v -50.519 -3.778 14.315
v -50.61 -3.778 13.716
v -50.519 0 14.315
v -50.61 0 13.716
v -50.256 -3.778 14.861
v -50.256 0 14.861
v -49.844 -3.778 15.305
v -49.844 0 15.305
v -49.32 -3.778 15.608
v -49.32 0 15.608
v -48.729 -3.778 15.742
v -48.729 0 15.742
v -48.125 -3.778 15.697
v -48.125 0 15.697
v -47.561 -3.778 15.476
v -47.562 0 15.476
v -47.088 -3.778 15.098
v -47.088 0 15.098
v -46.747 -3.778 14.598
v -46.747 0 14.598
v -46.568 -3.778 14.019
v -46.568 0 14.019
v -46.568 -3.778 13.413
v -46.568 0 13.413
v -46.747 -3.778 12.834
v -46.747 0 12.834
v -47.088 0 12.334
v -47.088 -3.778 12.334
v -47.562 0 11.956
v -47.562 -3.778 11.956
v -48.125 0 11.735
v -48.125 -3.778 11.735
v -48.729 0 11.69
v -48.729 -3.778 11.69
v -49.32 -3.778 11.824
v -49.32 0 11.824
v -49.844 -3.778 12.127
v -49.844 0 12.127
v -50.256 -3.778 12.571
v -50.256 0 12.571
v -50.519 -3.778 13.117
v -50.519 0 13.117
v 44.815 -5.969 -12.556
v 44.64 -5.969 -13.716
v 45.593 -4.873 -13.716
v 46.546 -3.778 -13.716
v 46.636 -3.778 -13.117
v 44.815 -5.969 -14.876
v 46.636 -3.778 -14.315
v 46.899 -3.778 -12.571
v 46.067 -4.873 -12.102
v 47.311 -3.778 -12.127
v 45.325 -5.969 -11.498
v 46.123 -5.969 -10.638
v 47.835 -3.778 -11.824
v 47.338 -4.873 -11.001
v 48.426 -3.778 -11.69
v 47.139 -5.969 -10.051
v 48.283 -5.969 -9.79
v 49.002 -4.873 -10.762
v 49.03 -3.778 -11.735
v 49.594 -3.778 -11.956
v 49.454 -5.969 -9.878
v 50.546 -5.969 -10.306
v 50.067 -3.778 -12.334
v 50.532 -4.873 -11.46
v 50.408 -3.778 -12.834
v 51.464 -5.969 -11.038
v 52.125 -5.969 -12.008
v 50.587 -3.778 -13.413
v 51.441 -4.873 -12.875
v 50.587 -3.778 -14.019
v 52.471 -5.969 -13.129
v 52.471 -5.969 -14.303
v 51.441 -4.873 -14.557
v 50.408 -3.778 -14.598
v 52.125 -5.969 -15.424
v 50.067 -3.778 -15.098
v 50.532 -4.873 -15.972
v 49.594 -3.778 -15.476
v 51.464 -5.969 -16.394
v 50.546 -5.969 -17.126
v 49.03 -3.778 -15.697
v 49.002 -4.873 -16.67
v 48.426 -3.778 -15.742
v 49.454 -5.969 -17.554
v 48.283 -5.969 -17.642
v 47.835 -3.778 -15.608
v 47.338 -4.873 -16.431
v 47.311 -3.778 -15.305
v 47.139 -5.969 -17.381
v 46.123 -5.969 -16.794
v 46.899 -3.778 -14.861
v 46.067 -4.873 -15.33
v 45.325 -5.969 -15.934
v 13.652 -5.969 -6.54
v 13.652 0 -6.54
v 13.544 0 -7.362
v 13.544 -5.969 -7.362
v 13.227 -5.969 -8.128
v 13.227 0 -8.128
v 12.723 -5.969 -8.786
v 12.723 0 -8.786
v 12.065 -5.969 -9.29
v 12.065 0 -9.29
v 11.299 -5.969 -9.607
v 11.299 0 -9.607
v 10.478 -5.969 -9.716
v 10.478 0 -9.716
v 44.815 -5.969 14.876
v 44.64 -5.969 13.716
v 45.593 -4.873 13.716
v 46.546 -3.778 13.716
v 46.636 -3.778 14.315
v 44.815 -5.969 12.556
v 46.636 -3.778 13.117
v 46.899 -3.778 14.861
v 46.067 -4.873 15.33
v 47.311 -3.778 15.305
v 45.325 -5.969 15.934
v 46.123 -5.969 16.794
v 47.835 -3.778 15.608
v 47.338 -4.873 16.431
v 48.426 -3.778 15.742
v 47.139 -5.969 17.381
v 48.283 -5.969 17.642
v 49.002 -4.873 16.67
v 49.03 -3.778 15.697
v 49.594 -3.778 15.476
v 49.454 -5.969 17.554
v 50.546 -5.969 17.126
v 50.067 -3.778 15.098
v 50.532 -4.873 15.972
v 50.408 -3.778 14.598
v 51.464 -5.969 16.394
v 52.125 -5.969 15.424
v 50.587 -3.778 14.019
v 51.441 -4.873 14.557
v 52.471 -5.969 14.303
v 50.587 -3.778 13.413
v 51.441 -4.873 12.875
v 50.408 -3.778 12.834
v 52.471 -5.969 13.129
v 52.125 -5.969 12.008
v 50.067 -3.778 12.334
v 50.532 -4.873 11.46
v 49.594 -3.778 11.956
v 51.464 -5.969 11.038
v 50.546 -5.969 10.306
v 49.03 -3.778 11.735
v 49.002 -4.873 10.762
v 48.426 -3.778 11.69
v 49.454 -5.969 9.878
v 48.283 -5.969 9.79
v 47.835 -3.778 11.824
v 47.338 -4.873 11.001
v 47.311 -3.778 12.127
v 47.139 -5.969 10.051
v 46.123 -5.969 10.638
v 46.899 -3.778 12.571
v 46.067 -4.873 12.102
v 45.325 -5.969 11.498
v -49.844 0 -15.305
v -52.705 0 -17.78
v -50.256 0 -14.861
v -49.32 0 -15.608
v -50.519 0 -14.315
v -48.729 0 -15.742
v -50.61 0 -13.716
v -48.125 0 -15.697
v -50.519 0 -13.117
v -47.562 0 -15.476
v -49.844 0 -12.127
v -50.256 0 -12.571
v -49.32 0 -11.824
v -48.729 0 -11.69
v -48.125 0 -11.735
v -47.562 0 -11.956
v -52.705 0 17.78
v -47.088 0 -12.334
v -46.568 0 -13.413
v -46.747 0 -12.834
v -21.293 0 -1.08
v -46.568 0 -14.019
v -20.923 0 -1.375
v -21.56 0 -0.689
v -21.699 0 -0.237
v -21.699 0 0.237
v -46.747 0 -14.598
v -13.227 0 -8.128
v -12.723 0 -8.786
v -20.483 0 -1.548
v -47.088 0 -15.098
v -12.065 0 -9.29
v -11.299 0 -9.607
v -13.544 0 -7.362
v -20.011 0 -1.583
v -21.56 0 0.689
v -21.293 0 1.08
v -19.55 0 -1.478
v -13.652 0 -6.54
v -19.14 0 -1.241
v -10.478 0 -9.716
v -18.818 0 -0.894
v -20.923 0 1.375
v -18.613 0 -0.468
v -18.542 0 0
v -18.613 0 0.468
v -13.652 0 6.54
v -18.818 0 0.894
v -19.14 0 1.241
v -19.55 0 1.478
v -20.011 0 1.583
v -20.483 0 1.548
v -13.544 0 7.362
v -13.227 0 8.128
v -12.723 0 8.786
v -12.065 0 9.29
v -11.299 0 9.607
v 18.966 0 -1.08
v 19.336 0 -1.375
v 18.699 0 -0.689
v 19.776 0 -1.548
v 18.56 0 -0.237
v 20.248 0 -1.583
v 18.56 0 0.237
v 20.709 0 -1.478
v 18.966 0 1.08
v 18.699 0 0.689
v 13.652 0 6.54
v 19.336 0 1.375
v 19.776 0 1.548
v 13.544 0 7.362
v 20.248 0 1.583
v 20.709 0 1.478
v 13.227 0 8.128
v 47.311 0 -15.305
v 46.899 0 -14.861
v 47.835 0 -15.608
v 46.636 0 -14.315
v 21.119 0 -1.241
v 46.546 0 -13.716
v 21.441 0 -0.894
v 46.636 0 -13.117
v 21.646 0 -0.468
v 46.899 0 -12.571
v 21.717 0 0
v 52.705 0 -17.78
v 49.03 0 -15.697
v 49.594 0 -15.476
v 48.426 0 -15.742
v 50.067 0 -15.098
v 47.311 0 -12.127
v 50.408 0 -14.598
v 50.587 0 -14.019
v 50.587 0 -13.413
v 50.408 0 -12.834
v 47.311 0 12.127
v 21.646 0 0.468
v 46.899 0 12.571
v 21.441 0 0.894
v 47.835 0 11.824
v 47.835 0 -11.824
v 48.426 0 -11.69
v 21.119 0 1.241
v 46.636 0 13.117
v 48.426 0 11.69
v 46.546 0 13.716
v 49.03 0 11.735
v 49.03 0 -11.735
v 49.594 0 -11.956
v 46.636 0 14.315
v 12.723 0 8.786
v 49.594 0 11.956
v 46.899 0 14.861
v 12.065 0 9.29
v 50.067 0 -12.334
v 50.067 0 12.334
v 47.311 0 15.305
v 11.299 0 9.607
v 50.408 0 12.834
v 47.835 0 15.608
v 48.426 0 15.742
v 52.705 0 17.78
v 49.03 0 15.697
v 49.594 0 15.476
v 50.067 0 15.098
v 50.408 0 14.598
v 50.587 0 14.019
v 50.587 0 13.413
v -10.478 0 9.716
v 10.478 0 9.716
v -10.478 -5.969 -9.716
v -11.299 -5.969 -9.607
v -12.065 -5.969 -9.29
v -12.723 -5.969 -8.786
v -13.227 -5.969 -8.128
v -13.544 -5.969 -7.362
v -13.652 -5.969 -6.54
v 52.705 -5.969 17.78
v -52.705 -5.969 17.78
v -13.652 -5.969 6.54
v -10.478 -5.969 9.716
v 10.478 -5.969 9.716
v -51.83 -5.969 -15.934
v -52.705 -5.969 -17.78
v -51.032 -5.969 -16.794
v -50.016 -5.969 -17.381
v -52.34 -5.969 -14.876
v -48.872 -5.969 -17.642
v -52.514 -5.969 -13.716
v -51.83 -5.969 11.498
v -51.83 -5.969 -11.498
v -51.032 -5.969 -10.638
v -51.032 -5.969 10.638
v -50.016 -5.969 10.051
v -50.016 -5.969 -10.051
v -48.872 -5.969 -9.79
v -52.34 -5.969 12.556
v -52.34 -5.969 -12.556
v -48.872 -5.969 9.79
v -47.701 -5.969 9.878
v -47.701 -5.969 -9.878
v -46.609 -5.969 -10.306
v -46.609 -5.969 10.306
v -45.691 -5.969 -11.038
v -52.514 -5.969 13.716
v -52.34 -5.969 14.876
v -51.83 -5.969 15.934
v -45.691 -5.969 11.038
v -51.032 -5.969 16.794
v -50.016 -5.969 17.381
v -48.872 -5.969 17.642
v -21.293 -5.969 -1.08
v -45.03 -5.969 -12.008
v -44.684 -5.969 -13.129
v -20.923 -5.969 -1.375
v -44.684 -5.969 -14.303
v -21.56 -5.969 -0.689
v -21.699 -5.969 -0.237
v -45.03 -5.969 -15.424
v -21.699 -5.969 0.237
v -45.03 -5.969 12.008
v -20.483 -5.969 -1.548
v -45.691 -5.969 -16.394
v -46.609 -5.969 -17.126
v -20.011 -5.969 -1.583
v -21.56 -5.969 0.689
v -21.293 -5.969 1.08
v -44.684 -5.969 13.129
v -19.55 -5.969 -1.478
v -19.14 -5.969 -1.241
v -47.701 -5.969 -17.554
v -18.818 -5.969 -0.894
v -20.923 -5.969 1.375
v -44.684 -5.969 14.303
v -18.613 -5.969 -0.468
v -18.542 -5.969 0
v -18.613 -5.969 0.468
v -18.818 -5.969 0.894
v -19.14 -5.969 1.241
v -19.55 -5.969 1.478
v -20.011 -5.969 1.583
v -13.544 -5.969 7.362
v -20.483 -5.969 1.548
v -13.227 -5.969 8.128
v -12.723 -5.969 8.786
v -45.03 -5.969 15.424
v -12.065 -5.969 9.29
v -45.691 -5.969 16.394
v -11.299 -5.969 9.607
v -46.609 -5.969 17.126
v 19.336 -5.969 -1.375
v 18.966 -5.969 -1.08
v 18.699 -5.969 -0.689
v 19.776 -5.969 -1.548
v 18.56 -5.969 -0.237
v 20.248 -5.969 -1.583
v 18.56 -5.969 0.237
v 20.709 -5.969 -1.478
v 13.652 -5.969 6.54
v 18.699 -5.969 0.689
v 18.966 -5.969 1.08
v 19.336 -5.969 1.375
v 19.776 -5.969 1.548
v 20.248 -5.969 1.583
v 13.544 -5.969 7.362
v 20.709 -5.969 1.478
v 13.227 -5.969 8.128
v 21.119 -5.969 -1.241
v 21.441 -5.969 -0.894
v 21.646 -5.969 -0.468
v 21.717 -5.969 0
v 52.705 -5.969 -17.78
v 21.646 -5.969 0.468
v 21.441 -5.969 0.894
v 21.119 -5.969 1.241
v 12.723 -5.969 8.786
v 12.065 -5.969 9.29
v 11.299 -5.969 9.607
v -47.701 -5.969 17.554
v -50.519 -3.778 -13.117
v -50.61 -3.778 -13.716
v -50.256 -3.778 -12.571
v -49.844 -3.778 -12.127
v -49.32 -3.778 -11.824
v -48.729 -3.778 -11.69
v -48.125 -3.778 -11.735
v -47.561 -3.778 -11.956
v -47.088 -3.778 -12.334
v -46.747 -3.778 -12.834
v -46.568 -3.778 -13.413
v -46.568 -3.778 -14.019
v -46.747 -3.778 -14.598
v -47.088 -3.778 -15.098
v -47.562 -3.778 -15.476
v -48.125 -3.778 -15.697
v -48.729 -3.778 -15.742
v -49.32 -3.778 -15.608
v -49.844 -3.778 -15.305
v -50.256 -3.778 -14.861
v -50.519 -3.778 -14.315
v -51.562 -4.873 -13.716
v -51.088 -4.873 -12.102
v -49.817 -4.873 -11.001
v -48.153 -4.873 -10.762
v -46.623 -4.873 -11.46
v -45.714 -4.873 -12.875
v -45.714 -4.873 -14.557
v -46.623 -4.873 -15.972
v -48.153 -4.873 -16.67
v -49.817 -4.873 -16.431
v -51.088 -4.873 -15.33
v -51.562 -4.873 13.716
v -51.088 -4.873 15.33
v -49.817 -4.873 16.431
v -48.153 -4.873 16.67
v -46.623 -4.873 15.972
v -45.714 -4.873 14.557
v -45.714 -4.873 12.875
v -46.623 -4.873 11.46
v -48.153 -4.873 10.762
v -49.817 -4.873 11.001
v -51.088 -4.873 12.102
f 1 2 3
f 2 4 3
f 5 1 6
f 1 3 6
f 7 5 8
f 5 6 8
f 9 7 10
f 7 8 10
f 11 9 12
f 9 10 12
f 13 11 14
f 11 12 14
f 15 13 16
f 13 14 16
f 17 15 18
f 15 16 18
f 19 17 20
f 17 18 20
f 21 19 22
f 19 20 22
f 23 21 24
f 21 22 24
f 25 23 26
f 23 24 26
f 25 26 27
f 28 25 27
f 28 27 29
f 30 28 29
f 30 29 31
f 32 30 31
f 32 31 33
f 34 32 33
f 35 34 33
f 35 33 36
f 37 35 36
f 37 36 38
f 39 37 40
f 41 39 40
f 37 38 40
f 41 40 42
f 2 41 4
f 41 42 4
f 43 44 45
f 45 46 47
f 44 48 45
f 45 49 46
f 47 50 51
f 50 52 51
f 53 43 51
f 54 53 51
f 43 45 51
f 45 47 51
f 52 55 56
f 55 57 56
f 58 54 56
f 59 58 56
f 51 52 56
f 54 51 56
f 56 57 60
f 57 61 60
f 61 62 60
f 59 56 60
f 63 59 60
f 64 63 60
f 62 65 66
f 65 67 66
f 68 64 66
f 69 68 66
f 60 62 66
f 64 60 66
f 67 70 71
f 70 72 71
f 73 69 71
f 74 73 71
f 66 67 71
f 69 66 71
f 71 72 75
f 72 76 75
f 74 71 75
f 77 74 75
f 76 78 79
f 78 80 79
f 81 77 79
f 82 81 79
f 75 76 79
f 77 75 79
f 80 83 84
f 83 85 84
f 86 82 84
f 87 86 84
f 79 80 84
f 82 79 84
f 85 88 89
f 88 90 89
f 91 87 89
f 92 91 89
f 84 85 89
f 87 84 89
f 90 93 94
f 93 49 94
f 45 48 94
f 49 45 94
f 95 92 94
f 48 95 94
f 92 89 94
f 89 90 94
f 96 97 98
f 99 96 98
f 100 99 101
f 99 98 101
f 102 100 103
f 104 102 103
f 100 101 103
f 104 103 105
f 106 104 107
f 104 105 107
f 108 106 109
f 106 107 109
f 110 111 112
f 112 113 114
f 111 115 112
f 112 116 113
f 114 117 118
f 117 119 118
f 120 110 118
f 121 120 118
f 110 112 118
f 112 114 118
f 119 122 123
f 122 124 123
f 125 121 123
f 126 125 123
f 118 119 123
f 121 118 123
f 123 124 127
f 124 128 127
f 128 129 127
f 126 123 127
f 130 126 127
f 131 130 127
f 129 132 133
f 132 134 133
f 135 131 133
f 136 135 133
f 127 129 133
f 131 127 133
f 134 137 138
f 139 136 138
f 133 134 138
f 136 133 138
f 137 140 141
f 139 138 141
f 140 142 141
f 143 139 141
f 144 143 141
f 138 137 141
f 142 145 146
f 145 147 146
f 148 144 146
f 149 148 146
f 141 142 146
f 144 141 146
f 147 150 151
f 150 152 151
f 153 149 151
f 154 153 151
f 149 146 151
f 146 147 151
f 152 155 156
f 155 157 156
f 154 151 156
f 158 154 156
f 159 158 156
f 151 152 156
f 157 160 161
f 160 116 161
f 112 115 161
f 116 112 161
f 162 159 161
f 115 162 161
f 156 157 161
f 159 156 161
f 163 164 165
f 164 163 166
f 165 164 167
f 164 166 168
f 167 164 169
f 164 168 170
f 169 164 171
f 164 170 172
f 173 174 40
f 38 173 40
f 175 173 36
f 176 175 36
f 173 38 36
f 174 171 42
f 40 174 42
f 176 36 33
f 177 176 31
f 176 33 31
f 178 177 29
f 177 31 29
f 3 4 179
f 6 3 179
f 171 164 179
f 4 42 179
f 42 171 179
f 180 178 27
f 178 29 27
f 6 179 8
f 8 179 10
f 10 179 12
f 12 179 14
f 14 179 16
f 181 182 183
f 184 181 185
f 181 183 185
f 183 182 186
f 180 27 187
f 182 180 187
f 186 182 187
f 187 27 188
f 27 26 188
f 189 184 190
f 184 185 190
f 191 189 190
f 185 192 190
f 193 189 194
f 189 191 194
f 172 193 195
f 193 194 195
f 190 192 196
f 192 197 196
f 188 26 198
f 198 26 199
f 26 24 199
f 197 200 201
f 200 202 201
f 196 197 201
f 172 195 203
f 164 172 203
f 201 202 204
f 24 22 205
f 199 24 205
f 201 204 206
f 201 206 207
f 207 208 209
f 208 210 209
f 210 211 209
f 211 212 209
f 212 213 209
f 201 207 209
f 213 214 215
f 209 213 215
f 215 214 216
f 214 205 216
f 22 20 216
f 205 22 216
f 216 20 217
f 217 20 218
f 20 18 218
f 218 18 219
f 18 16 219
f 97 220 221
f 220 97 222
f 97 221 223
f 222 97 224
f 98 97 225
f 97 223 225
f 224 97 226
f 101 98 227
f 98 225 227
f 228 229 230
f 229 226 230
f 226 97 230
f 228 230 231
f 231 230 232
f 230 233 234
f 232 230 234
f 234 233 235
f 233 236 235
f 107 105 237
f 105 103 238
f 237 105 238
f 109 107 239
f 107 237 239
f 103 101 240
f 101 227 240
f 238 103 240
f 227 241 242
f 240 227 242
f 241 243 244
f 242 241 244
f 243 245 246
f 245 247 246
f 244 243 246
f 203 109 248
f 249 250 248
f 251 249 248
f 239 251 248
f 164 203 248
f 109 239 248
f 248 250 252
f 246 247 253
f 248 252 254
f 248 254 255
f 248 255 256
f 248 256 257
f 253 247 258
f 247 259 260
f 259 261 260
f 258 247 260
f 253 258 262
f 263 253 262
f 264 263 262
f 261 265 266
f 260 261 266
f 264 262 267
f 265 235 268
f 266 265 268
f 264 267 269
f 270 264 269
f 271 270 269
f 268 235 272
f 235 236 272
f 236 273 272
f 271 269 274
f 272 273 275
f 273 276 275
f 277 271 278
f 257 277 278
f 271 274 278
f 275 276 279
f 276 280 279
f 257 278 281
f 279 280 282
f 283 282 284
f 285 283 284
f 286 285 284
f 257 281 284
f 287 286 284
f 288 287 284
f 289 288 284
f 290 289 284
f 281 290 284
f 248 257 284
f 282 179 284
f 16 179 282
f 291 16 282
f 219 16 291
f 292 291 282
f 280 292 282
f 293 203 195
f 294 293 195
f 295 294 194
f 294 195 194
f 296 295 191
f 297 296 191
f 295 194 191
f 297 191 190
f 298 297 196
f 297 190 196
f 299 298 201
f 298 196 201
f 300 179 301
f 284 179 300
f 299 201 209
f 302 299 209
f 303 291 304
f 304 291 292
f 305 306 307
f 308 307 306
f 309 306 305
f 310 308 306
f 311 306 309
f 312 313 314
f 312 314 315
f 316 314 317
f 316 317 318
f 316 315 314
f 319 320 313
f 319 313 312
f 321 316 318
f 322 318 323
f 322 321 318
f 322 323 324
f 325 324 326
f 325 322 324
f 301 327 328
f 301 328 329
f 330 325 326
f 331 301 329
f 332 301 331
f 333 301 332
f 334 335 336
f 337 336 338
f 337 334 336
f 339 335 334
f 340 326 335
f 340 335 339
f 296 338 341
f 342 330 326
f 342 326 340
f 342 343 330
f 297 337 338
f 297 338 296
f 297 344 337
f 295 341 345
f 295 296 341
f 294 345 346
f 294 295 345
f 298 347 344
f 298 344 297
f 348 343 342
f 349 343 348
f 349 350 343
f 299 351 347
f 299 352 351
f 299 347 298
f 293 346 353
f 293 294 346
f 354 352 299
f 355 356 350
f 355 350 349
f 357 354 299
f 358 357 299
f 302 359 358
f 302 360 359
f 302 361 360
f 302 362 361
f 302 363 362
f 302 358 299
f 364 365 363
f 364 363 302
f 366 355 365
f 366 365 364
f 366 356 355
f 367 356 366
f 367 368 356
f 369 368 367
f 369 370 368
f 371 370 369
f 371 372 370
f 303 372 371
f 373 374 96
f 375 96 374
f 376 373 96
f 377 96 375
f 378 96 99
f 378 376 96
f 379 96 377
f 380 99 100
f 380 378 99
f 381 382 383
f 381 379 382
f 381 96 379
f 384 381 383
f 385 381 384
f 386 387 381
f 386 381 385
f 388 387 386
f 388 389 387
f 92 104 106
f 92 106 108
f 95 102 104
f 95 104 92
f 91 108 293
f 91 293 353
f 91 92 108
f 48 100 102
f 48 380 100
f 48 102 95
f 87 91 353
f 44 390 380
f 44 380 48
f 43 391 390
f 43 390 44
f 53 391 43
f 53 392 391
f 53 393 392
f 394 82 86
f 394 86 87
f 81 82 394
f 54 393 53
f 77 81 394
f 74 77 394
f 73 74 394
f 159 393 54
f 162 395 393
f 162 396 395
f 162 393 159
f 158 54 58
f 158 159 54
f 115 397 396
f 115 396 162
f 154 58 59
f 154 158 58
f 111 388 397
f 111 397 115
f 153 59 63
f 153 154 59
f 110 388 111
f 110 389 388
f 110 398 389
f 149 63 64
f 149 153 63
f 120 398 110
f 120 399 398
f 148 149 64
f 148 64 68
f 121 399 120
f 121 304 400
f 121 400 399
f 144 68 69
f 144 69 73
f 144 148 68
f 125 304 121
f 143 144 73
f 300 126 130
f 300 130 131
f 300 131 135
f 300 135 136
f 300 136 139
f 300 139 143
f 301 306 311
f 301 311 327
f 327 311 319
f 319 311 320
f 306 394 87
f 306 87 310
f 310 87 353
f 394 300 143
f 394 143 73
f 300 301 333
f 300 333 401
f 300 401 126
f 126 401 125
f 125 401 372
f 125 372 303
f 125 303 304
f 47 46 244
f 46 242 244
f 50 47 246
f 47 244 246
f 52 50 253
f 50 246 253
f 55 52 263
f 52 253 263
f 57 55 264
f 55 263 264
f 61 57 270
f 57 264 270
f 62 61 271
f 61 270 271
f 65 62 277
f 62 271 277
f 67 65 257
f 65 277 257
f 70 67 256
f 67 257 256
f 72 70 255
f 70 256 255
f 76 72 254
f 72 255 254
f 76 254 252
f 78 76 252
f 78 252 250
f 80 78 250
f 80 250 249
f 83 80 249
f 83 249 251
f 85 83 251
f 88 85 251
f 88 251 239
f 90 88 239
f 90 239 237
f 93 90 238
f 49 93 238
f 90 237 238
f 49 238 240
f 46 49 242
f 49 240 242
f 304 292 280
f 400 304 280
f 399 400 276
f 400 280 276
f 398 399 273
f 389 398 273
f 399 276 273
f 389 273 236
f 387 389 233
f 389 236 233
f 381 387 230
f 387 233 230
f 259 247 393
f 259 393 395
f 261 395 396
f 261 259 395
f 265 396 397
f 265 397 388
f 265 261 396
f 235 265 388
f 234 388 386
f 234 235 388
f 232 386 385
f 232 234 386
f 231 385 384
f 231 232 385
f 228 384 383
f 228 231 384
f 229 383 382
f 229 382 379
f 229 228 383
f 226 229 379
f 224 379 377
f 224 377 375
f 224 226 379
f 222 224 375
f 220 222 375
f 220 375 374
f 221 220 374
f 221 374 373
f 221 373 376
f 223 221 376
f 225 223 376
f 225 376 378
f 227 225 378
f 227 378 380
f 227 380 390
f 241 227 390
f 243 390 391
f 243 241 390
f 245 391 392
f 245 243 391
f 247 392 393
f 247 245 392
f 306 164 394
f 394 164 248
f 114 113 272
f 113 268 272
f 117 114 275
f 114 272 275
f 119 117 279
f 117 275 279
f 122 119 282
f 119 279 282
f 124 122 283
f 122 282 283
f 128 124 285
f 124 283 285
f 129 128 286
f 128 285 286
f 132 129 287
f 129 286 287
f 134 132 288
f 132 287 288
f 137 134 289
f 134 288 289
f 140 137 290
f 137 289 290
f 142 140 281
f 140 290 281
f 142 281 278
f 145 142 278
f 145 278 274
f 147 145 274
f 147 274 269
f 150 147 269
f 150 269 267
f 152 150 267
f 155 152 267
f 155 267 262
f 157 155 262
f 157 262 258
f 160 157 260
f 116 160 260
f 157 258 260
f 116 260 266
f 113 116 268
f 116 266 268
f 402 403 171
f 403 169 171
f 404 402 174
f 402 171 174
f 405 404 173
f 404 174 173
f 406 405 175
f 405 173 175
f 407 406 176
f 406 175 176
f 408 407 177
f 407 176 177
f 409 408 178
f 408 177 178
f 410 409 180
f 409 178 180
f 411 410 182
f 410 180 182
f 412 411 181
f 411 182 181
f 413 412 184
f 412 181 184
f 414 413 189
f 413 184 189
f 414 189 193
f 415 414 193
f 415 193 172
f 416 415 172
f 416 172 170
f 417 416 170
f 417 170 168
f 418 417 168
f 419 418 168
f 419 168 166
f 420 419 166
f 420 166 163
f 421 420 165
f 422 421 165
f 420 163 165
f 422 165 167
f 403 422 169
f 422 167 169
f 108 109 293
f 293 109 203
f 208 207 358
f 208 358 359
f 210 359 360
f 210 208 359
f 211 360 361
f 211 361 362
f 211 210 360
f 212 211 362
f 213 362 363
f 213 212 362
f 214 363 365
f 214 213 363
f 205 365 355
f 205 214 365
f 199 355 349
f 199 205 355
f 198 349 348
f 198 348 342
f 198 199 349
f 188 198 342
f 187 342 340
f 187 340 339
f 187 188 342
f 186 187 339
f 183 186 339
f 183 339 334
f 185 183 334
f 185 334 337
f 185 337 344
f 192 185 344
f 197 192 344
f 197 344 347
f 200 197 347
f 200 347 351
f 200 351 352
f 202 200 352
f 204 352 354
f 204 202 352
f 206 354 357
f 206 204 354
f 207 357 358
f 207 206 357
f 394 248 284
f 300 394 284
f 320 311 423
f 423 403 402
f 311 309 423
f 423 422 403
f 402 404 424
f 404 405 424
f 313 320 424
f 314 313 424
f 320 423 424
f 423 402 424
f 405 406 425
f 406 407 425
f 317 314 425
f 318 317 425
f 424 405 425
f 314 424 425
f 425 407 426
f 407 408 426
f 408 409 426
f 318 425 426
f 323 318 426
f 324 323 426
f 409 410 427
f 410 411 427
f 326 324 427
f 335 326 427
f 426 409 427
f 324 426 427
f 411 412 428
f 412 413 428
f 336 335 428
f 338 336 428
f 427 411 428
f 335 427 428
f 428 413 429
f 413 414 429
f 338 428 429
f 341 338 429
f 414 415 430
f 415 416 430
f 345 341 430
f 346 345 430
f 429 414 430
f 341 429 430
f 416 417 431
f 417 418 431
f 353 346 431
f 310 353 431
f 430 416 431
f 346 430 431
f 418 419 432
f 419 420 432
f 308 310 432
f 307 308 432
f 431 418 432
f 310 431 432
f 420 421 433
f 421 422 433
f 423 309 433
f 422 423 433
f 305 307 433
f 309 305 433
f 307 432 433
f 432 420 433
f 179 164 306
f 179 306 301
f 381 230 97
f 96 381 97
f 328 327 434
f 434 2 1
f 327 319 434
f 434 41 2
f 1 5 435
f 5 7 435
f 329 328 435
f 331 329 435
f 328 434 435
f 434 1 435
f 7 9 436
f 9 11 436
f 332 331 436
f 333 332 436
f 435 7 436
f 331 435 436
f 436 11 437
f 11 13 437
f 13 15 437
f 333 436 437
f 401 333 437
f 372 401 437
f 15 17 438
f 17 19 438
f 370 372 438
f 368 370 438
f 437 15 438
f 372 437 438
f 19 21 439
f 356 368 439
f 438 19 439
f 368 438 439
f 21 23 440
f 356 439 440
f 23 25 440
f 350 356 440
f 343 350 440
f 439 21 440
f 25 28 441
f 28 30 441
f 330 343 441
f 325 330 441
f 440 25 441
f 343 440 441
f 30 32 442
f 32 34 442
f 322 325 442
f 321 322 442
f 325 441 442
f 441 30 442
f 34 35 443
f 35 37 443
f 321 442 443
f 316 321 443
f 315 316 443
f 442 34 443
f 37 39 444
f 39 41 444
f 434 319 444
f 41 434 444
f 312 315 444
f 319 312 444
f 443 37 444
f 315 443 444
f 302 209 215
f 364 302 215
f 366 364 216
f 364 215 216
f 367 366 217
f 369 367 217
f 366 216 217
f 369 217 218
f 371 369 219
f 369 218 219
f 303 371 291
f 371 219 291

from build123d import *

# Parameters (mm, degrees)
F0_W           = 105.41
F0_H           = 35.56
F0_R           = 1.5875
F1_DEPTH       = 5.969
F3_D           = 4.064
F3_DEPTH       = 50.8
F3_CSINK_D     = 7.874
F3_CSINK_ANGLE = 82


with BuildPart() as f1:
    # F0 (on Front) → F1 (new body)
    with BuildSketch(Plane.XZ):
        Rectangle(F0_W, F0_H)
        with Locations((-20.1295, 0)):
            Circle(F0_R, mode=Mode.SUBTRACT)
        with BuildLine():
            Line((-10.4775, 9.7155), (10.4775, 9.7155))
            ThreePointArc((10.4775, 9.7155), (12.722564, 8.785564), (13.6525, 6.5405))
            Line((13.6525, 6.5405), (13.6525, -6.5405))
            ThreePointArc((13.6525, -6.5405), (12.722564, -8.785564), (10.4775, -9.7155))
            Line((10.4775, -9.7155), (-10.4775, -9.7155))
            ThreePointArc((-10.4775, -9.7155), (-12.722564, -8.785564), (-13.6525, -6.5405))
            Line((-13.6525, -6.5405), (-13.6525, 6.5405))
            ThreePointArc((-13.6525, 6.5405), (-12.722564, 8.785564), (-10.4775, 9.7155))
        make_face(mode=Mode.SUBTRACT)
        with Locations((20.1295, 0)):
            Circle(F0_R, mode=Mode.SUBTRACT)
    extrude(amount=F1_DEPTH)

    # F3
    with Locations(Plane.XZ.offset(5.969)):
        with Locations((-48.5775, 13.716), (-48.5775, -13.716), (48.5775, -13.716), (48.5775, 13.716)):
            CounterSinkHole(F3_D / 2, F3_CSINK_D / 2, depth=F3_DEPTH, counter_sink_angle=F3_CSINK_ANGLE)


solid = f1.part
